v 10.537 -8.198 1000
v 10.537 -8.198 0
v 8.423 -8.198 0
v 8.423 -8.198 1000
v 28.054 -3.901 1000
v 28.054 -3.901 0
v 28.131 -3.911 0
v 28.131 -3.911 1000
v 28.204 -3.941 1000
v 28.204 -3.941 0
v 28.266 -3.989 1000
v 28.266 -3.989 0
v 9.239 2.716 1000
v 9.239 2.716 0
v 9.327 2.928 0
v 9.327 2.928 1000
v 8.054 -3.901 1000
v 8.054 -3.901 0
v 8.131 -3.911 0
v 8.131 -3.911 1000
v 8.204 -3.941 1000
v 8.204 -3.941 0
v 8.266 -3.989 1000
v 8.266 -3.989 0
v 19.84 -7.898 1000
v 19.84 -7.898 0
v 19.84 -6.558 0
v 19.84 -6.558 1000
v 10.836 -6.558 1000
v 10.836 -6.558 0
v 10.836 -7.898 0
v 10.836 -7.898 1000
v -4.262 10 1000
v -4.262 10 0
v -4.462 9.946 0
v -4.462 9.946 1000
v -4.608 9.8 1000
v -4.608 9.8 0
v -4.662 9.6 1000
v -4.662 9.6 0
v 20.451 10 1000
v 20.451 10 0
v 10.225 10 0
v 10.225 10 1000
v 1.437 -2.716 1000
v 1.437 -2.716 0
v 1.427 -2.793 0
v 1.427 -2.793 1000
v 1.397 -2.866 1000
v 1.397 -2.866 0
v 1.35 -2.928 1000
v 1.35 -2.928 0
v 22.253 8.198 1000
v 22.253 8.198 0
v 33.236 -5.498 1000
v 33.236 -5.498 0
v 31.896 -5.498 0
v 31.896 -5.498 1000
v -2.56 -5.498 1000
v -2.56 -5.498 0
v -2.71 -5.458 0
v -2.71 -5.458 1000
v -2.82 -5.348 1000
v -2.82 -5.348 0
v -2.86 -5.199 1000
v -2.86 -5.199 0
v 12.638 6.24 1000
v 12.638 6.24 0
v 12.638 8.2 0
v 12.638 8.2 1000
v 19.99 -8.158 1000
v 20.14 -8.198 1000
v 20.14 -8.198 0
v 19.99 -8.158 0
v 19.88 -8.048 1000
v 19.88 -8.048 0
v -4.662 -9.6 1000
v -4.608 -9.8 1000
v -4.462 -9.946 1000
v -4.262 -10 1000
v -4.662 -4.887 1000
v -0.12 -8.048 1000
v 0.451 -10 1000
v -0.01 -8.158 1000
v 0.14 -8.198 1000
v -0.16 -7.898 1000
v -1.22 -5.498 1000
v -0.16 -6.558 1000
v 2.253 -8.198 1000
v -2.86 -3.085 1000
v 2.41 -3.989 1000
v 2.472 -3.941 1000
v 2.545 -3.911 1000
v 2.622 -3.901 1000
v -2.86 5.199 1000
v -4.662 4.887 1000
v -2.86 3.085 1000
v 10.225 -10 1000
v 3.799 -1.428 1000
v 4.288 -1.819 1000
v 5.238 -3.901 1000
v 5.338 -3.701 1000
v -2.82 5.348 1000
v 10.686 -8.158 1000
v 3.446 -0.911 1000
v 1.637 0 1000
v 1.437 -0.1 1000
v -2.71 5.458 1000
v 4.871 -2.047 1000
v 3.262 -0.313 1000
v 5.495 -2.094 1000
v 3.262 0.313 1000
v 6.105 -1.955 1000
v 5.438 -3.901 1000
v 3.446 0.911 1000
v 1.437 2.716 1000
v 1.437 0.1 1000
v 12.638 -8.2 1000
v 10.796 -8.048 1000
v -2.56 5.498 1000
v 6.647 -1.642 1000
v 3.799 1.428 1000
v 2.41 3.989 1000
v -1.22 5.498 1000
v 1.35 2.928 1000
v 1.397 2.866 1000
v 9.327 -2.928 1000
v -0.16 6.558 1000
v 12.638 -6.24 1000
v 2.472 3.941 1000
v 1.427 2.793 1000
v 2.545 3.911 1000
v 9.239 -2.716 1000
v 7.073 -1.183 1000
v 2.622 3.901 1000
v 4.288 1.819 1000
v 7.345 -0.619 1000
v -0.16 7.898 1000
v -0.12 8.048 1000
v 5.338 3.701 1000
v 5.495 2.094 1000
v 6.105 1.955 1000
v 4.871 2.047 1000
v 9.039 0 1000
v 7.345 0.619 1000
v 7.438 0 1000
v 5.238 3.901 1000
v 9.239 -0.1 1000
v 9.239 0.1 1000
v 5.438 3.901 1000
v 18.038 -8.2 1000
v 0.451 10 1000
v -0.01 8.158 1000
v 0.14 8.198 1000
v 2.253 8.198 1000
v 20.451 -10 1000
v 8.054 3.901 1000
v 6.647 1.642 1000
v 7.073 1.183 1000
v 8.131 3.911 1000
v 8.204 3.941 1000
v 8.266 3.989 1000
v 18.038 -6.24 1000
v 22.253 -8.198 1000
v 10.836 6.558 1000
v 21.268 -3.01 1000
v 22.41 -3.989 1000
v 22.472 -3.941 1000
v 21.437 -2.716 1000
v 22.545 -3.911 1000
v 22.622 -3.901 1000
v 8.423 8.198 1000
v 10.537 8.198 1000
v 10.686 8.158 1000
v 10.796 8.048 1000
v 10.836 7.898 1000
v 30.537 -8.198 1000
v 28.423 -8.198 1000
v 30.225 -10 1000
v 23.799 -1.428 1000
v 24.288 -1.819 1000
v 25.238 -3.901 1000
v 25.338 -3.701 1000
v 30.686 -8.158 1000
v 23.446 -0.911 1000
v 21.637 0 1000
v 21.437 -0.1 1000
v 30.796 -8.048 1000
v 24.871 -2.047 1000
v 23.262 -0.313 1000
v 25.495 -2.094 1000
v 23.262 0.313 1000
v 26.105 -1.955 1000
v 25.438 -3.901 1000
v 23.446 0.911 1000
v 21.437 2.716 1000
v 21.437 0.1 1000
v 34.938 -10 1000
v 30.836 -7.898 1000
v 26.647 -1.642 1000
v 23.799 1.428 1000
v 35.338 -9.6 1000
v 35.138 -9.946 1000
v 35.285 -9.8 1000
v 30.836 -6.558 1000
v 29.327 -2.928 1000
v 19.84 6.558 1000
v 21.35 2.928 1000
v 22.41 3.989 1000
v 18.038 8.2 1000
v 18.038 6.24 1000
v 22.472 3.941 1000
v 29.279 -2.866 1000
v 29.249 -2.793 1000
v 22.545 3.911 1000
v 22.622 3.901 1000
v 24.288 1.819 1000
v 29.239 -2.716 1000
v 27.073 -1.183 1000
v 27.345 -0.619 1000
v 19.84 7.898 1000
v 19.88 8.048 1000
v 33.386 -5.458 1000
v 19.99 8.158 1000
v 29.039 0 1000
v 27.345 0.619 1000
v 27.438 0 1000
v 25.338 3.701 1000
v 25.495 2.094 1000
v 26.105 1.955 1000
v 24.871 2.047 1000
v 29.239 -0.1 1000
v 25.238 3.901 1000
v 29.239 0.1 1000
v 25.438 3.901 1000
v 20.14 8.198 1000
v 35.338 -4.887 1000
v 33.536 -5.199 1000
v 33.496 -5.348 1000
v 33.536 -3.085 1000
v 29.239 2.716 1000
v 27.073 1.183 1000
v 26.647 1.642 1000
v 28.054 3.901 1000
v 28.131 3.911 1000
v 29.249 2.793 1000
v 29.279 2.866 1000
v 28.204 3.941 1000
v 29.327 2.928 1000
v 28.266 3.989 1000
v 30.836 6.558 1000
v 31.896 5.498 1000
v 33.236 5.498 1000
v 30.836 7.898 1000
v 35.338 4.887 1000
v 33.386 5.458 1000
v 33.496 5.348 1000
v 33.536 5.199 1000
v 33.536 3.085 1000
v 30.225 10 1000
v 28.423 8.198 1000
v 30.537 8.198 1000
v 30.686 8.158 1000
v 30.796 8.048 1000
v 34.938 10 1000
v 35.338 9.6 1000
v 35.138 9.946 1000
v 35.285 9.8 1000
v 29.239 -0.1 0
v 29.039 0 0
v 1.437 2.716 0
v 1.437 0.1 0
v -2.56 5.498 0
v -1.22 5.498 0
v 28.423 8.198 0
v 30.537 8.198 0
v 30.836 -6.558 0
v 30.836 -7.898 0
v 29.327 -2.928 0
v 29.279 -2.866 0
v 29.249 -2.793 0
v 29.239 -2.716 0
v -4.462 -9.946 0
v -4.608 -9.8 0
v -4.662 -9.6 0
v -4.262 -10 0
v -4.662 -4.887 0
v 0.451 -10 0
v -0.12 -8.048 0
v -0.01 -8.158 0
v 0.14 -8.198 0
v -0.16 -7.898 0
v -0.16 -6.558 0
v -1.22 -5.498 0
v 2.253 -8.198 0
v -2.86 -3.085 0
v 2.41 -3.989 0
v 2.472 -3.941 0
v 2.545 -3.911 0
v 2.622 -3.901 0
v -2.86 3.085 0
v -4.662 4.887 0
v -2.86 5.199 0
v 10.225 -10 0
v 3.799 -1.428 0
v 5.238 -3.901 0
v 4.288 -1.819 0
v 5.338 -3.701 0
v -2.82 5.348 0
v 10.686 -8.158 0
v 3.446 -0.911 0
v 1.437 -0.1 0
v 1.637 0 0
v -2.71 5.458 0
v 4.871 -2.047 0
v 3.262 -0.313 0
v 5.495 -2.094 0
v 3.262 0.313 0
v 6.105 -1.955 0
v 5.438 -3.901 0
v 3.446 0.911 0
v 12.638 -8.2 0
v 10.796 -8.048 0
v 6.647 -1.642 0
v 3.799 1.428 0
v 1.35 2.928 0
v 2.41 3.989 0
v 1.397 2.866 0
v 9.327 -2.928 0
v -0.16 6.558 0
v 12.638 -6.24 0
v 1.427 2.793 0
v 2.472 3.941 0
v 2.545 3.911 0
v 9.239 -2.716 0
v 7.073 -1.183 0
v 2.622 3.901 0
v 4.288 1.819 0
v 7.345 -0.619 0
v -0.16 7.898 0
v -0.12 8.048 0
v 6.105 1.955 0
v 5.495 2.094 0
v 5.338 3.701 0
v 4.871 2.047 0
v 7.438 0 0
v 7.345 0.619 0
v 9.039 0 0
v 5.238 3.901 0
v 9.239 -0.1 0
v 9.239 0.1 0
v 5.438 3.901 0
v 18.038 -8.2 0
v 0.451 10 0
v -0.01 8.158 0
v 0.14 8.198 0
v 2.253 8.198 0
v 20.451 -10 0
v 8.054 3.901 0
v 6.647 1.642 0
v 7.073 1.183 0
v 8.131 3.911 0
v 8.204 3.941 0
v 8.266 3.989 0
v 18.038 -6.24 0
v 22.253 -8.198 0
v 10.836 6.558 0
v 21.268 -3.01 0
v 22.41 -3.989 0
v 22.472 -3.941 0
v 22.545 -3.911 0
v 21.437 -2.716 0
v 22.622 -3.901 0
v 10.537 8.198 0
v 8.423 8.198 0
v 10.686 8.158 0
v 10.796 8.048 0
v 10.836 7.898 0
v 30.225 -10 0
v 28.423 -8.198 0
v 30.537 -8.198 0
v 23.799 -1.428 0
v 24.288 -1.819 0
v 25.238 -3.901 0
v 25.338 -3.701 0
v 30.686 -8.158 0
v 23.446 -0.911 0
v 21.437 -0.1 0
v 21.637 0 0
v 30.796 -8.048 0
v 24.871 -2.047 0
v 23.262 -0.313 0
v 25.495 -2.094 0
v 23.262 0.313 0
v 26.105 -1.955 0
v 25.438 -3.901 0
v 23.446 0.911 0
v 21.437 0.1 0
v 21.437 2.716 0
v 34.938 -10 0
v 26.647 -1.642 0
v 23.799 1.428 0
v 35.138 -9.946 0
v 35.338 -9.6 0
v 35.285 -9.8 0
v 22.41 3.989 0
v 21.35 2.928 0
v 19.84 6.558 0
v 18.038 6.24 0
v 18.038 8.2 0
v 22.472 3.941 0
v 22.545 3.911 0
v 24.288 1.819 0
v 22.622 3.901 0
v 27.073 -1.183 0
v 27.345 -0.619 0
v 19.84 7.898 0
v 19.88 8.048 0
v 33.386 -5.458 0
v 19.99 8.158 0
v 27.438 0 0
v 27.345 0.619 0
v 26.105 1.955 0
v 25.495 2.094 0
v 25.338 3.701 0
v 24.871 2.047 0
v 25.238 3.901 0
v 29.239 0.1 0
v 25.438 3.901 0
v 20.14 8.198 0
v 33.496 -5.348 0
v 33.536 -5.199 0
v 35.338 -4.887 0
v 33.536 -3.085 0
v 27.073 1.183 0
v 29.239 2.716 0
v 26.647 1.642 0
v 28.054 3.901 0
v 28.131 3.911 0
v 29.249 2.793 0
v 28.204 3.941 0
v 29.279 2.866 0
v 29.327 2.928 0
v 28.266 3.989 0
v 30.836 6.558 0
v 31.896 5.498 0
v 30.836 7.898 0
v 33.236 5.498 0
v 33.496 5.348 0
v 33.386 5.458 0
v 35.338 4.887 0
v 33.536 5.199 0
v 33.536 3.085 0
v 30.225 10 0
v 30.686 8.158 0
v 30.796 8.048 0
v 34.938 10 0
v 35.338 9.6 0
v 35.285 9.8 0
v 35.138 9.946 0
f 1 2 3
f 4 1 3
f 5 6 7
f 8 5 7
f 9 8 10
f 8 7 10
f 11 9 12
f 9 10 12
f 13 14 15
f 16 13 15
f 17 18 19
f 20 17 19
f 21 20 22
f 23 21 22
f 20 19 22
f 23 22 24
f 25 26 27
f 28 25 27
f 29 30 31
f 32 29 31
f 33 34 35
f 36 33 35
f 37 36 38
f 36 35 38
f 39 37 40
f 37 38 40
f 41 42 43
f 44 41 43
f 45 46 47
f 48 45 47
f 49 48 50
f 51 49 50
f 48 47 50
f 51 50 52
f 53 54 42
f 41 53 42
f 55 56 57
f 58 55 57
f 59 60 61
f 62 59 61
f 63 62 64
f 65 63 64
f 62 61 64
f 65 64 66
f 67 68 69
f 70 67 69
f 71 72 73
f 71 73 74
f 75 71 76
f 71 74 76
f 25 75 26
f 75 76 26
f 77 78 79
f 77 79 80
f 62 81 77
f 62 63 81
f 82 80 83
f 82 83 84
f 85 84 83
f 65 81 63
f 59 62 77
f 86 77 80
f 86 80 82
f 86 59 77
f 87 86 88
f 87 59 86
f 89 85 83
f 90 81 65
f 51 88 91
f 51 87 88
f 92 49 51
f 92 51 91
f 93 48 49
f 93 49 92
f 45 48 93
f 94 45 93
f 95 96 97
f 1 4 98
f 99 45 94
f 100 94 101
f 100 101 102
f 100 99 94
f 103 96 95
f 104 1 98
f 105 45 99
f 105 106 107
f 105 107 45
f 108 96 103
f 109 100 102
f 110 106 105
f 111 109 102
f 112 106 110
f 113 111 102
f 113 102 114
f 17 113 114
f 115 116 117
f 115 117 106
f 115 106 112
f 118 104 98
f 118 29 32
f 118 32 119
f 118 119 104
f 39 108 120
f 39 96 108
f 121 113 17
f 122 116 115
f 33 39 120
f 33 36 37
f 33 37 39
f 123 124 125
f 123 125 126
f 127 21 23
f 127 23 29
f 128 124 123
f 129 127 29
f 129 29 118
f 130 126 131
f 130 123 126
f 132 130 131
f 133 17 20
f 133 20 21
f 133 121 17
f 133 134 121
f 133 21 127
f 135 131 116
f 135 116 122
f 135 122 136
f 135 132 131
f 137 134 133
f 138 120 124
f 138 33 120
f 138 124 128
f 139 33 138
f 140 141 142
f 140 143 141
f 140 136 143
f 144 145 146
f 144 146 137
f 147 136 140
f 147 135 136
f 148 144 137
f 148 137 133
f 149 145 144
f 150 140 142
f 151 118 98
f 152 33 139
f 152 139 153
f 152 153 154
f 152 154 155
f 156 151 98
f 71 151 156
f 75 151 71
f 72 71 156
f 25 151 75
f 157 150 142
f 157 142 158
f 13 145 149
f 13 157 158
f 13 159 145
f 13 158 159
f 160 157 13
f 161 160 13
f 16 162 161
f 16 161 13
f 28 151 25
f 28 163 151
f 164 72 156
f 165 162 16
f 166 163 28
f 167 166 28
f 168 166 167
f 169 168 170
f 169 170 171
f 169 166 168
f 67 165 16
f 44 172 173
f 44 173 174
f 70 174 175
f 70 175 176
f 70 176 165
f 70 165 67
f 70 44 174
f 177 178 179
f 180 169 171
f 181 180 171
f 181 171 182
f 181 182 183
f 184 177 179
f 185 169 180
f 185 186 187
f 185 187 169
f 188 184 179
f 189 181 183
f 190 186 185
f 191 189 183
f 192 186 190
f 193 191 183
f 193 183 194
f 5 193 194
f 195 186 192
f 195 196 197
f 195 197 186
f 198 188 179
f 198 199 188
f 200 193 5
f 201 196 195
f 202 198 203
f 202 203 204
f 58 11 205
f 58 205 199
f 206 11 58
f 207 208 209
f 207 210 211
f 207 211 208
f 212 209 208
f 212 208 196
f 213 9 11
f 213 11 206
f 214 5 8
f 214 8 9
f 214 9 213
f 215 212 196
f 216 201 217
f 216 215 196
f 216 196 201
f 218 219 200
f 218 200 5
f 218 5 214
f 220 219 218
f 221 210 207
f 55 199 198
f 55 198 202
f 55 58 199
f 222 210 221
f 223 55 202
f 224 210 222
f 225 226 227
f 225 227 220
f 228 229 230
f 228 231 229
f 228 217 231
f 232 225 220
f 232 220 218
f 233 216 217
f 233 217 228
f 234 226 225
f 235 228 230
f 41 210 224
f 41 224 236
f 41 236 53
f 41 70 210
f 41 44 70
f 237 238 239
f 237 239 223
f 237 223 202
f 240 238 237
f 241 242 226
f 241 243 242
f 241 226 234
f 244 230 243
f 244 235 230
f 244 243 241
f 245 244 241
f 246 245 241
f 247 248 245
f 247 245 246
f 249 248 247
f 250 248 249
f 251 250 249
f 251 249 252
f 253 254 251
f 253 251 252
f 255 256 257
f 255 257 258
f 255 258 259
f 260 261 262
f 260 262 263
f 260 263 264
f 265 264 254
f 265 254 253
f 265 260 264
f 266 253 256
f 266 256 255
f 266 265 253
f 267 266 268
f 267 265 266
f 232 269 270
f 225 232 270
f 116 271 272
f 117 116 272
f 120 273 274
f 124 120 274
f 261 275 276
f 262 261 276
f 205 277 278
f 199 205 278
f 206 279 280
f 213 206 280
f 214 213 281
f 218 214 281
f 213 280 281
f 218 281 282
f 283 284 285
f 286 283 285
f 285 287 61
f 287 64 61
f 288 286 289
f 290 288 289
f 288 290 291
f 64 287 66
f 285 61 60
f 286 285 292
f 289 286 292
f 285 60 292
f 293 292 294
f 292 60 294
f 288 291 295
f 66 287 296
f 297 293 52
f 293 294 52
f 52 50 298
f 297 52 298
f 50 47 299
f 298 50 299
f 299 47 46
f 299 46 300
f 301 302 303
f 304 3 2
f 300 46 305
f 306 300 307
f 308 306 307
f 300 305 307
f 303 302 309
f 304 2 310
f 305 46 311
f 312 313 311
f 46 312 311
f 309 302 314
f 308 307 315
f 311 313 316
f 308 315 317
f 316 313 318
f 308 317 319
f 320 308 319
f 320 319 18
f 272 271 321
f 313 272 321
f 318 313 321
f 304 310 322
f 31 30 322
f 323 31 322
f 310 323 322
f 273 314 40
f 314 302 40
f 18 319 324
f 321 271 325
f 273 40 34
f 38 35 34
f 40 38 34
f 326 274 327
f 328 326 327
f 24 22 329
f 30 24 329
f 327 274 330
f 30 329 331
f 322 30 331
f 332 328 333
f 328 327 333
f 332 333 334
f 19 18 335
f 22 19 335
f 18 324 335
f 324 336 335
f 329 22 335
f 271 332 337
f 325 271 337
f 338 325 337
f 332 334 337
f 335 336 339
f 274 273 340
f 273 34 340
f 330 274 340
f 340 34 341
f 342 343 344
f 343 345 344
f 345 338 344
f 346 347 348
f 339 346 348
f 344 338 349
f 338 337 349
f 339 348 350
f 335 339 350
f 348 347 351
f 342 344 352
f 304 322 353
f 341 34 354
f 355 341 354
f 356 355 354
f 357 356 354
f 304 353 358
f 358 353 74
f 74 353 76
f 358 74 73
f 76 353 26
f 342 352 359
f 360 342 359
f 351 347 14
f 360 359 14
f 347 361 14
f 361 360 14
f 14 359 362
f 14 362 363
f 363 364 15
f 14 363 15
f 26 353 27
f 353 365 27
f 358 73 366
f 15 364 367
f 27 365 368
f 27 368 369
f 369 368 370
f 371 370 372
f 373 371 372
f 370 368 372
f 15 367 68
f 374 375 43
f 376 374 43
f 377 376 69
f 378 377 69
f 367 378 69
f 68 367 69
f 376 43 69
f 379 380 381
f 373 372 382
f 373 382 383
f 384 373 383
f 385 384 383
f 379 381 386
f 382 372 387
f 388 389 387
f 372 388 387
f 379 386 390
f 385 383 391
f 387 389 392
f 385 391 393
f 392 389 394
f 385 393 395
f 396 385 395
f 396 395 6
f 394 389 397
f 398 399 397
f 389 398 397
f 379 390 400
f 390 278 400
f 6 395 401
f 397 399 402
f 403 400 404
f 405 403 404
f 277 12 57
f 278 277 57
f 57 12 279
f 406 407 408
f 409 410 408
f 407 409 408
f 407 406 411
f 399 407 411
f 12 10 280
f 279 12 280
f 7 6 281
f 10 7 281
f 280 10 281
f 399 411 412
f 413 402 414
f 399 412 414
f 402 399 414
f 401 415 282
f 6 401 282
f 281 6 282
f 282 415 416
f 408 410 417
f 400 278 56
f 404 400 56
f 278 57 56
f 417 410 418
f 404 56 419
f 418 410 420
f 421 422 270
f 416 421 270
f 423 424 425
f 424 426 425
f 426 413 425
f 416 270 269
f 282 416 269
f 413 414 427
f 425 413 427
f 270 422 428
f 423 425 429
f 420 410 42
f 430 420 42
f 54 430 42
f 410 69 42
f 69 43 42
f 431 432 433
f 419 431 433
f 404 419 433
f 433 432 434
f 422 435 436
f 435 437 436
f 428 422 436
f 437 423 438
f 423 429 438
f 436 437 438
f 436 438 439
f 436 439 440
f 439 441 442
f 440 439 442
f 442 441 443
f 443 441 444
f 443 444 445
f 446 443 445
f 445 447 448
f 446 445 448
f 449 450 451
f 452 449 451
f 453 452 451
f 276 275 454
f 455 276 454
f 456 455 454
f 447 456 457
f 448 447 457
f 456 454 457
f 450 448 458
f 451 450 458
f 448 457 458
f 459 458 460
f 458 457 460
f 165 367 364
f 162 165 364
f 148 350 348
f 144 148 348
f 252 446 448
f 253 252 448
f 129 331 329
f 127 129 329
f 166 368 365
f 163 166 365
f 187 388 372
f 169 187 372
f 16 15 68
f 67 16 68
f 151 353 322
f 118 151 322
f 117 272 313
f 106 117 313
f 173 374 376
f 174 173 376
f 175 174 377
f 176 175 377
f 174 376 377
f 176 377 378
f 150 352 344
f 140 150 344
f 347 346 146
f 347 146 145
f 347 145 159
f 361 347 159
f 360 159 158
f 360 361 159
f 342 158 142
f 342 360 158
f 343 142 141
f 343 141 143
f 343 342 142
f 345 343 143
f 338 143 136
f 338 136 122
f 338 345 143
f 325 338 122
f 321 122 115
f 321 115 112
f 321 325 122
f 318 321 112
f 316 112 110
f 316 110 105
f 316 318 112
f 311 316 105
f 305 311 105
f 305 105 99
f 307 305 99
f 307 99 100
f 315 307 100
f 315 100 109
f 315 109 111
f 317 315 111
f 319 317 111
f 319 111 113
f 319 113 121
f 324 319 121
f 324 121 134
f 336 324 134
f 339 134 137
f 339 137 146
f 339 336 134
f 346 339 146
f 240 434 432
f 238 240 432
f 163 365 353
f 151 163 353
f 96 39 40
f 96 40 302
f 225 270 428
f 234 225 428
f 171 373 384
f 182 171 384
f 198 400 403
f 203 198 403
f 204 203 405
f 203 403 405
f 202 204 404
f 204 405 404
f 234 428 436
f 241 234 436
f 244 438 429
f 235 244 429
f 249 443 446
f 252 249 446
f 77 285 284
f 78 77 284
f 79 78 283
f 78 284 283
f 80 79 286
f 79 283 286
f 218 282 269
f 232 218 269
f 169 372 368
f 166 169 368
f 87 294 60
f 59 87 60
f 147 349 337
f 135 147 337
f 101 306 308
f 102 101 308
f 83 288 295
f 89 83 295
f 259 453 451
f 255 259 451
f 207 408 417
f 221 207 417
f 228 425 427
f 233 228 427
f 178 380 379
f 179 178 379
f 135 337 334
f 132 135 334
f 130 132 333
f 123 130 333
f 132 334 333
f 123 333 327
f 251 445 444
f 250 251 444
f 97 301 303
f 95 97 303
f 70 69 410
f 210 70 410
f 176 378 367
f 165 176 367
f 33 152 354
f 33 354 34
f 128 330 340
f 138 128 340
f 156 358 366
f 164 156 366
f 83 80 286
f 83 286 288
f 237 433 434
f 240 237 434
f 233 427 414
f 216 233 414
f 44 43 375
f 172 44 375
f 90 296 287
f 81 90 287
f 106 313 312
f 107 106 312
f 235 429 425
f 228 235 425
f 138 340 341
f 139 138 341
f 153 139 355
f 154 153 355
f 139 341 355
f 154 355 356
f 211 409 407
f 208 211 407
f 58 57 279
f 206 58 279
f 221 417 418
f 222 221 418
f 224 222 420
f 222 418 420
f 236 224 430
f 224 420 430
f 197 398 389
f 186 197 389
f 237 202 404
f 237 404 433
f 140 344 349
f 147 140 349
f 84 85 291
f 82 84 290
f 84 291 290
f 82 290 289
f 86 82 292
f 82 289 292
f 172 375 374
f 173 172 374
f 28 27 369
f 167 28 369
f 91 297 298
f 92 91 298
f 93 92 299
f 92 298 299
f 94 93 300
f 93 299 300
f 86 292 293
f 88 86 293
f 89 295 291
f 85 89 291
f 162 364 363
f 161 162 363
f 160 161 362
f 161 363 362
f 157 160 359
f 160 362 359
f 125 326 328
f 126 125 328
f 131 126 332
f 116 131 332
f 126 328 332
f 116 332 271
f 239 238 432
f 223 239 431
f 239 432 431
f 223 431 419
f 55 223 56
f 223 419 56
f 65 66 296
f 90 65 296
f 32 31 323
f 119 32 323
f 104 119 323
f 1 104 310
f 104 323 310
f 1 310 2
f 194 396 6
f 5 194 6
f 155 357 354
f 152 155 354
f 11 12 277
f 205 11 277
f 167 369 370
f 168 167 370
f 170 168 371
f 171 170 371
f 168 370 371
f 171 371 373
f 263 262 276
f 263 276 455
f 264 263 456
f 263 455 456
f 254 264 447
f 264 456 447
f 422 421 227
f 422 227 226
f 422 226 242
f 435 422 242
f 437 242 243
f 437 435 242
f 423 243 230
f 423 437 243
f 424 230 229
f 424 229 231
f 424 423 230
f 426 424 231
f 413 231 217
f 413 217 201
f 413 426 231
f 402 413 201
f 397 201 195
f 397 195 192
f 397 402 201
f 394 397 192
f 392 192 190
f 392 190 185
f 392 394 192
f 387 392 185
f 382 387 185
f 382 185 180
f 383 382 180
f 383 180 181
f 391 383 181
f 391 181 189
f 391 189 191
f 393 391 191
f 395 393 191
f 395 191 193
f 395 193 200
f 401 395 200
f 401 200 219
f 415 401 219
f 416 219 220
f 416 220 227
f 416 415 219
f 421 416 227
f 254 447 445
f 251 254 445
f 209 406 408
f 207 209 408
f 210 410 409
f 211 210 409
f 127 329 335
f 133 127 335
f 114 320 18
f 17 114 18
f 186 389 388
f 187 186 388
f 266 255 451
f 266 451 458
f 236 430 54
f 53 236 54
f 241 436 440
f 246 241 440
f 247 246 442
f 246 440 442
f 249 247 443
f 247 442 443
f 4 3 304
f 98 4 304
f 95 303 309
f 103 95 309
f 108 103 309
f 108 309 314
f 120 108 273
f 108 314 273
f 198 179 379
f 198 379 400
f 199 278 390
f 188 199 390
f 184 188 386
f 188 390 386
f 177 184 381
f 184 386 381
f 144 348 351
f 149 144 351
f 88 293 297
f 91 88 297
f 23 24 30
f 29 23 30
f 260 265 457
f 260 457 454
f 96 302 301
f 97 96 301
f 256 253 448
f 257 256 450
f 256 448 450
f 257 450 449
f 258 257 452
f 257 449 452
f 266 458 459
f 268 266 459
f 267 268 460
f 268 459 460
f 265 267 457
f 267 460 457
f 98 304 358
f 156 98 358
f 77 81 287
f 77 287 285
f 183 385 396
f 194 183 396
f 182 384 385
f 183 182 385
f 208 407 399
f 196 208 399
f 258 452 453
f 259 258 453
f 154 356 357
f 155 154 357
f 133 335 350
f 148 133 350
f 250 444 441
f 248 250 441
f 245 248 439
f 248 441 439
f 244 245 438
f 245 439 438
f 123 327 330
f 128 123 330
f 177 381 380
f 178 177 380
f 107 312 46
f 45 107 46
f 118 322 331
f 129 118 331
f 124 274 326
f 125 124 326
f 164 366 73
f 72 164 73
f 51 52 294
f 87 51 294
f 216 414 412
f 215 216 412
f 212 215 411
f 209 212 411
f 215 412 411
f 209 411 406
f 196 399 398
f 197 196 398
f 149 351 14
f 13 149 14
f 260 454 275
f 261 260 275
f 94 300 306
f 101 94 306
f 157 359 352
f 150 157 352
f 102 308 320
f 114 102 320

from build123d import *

# Parameters (mm, degrees)
F0_R     = 2.1
F1_DEPTH = 1000


# Not quite as in the source:
# - ends of sketch curves that miss each other by under 0.0002 mm in the source are joined


with BuildPart() as f1:
    # F0 (on Top) → F1 (new body)
    with BuildSketch(Plane.XY):
        with BuildLine():
            Line((-2.860219, 3.085333), (-2.860219, 5.198566))
            ThreePointArc((-2.860219, 5.198566), (-2.7720364303, 5.4101211696), (-2.56022, 5.497674))
            Line((-2.56022, 5.497674), (-1.22022, 5.497674))
            Line((-1.22022, 5.497674), (1.349586, 2.927868))
            ThreePointArc((1.349586, 2.927868), (1.4146178598, 2.8305410297), (1.437454, 2.715736))
            Line((1.437454, 2.715736), (1.437454, 0.1))
            Line((1.437454, 0.1), (1.637454, 0))
            Line((1.637454, 0), (1.437454, -0.1))
            Line((1.437454, -0.1), (1.437454, -2.715736))
            ThreePointArc((1.437454, -2.715736), (1.4146178598, -2.8305410297), (1.3495860344, -2.9278680344))
            Line((1.3495860344, -2.9278680344), (-1.22022, -5.497674))
            Line((-1.22022, -5.497674), (-2.56022, -5.497674))
            ThreePointArc((-2.56022, -5.497674), (-2.7720364303, -5.4101211696), (-2.8602186739, -5.198565999))
            Line((-2.8602186739, -5.198565999), (-2.860219, -3.085333))
            Line((-2.860219, -3.085333), (-4.661886, -4.887))
            Line((-4.661886, -4.887), (-4.661886, -9.6))
            ThreePointArc((-4.661886, -9.6), (-4.5447287125, -9.8828427125), (-4.261886, -10))
            Line((-4.261886, -10), (0.451114, -10))
            Line((0.451114, -10), (2.252781, -8.198333))
            Line((2.252781, -8.198333), (0.139548, -8.198333))
            ThreePointArc((0.139548, -8.198333), (-0.0720071696, -8.1101504303), (-0.15956, -7.898334))
            Line((-0.15956, -7.898334), (-0.15956, -6.558334))
            Line((-0.15956, -6.558334), (2.410246, -3.988528))
            ThreePointArc((2.410246, -3.988528), (2.5075729703, -3.9234961402), (2.622378, -3.90066))
            Line((2.622378, -3.90066), (5.238114, -3.90066))
            Line((5.238114, -3.90066), (5.338114, -3.70066))
            Line((5.338114, -3.70066), (5.438114, -3.90066))
            Line((5.438114, -3.90066), (8.05385, -3.90066))
            ThreePointArc((8.05385, -3.90066), (8.1686550297, -3.9234961402), (8.2659820344, -3.9885279656))
            Line((8.2659820344, -3.9885279656), (10.835788, -6.558334))
            Line((10.835788, -6.558334), (10.835788, -7.898334))
            ThreePointArc((10.835788, -7.898334), (10.7482351696, -8.1101504303), (10.536679999, -8.1983326739))
            Line((10.536679999, -8.1983326739), (8.423447, -8.198333))
            Line((8.423447, -8.198333), (10.225114, -10))
            Line((10.225114, -10), (20.451114, -10))
            Line((20.451114, -10), (22.252781, -8.198333))
            Line((22.252781, -8.198333), (20.139548, -8.198333))
            ThreePointArc((20.139548, -8.198333), (19.9279928304, -8.1101504303), (19.84044, -7.898334))
            Line((19.84044, -7.898334), (19.84044, -6.558334))
            Line((19.84044, -6.558334), (22.410246, -3.988528))
            ThreePointArc((22.410246, -3.988528), (22.5075729703, -3.9234961402), (22.622378, -3.90066))
            Line((22.622378, -3.90066), (25.238114, -3.90066))
            Line((25.238114, -3.90066), (25.338114, -3.70066))
            Line((25.338114, -3.70066), (25.438114, -3.90066))
            Line((25.438114, -3.90066), (28.05385, -3.90066))
            ThreePointArc((28.05385, -3.90066), (28.1686550297, -3.9234961402), (28.2659820344, -3.9885279656))
            Line((28.2659820344, -3.9885279656), (30.835788, -6.558334))
            Line((30.835788, -6.558334), (30.835788, -7.898334))
            ThreePointArc((30.835788, -7.898334), (30.7482351696, -8.1101504303), (30.536679999, -8.1983326739))
            Line((30.536679999, -8.1983326739), (28.423447, -8.198333))
            Line((28.423447, -8.198333), (30.225114, -10))
            Line((30.225114, -10), (34.938114, -10))
            ThreePointArc((34.938114, -10), (35.2209567125, -9.8828427125), (35.338114, -9.6))
            Line((35.338114, -9.6), (35.338114, -4.887))
            Line((35.338114, -4.887), (33.536447, -3.085333))
            Line((33.536447, -3.085333), (33.536447, -5.198566))
            ThreePointArc((33.536447, -5.198566), (33.4482644303, -5.4101211696), (33.236448, -5.497674))
            Line((33.236448, -5.497674), (31.896448, -5.497674))
            Line((31.896448, -5.497674), (29.326642, -2.927868))
            ThreePointArc((29.326642, -2.927868), (29.2616101402, -2.8305410297), (29.238774, -2.715736))
            Line((29.238774, -2.715736), (29.238774, -0.1))
            Line((29.238774, -0.1), (29.038774, 0))
            Line((29.038774, 0), (29.238774, 0.1))
            Line((29.238774, 0.1), (29.238774, 2.715736))
            ThreePointArc((29.238774, 2.715736), (29.2616101402, 2.8305410297), (29.3266419656, 2.9278680344))
            Line((29.3266419656, 2.9278680344), (31.896448, 5.497674))
            Line((31.896448, 5.497674), (33.236448, 5.497674))
            ThreePointArc((33.236448, 5.497674), (33.4482644303, 5.4101211696), (33.5364466739, 5.198565999))
            Line((33.5364466739, 5.198565999), (33.536447, 3.085333))
            Line((33.536447, 3.085333), (35.338114, 4.887))
            Line((35.338114, 4.887), (35.338114, 9.6))
            ThreePointArc((35.338114, 9.6), (35.2209567125, 9.8828427125), (34.938114, 10))
            Line((34.938114, 10), (30.225114, 10))
            Line((30.225114, 10), (28.423447, 8.198333))
            Line((28.423447, 8.198333), (30.53668, 8.198333))
            ThreePointArc((30.53668, 8.198333), (30.7482351696, 8.1101504303), (30.835788, 7.898334))
            Line((30.835788, 7.898334), (30.835788, 6.558334))
            Line((30.835788, 6.558334), (28.265982, 3.988528))
            ThreePointArc((28.265982, 3.988528), (28.1686550297, 3.9234961402), (28.05385, 3.90066))
            Line((28.05385, 3.90066), (25.438114, 3.90066))
            Line((25.438114, 3.90066), (25.338114, 3.70066))
            Line((25.338114, 3.70066), (25.238114, 3.90066))
            Line((25.238114, 3.90066), (22.622378, 3.90066))
            ThreePointArc((22.622378, 3.90066), (22.5075729703, 3.9234961402), (22.4102459656, 3.9885279656))
            Line((22.4102459656, 3.9885279656), (19.84044, 6.558334))
            Line((19.84044, 6.558334), (19.84044, 7.898334))
            ThreePointArc((19.84044, 7.898334), (19.9279928304, 8.1101504303), (20.139548001, 8.1983326739))
            Line((20.139548001, 8.1983326739), (22.252781, 8.198333))
            Line((22.252781, 8.198333), (20.451114, 10))
            Line((20.451114, 10), (10.225114, 10))
            Line((10.225114, 10), (8.423447, 8.198333))
            Line((8.423447, 8.198333), (10.53668, 8.198333))
            ThreePointArc((10.53668, 8.198333), (10.7482351696, 8.1101504303), (10.835788, 7.898334))
            Line((10.835788, 7.898334), (10.835788, 6.558334))
            Line((10.835788, 6.558334), (8.265982, 3.988528))
            ThreePointArc((8.265982, 3.988528), (8.1686550297, 3.9234961402), (8.05385, 3.90066))
            Line((8.05385, 3.90066), (5.438114, 3.90066))
            Line((5.438114, 3.90066), (5.338114, 3.70066))
            Line((5.338114, 3.70066), (5.238114, 3.90066))
            Line((5.238114, 3.90066), (2.622378, 3.90066))
            ThreePointArc((2.622378, 3.90066), (2.5075729703, 3.9234961402), (2.4102459656, 3.9885279656))
            Line((2.4102459656, 3.9885279656), (-0.15956, 6.558334))
            Line((-0.15956, 6.558334), (-0.15956, 7.898334))
            ThreePointArc((-0.15956, 7.898334), (-0.0720071696, 8.1101504303), (0.139548001, 8.1983326739))
            Line((0.139548001, 8.1983326739), (2.252781, 8.198333))
            Line((2.252781, 8.198333), (0.451114, 10))
            Line((0.451114, 10), (-4.261886, 10))
            ThreePointArc((-4.261886, 10), (-4.5447287125, 9.8828427125), (-4.661886, 9.6))
            Line((-4.661886, 9.6), (-4.661886, 4.887))
            Line((-4.661886, 4.887), (-2.860219, 3.085333))
        make_face()
        with Locations((5.338114, 0)):
            Circle(F0_R, mode=Mode.SUBTRACT)
        Polygon((12.638114, 6.24), (12.638114, 8.2), (18.038114, 8.2), (18.038114, 6.24), (21.349586, 2.927868), (21.437454, 2.715736), (21.437454, 0.1), (21.637454, 0), (21.437454, -0.1), (21.437454, -2.715736), (21.267706, -3.009748), (18.038114, -6.24), (18.037784, -8.2), (12.638114, -8.2), (12.638444, -6.23967), (9.326642, -2.927868), (9.238774, -2.715736), (9.238774, -0.1), (9.038774, 0), (9.238774, 0.1), (9.238774, 2.715736), (9.326642, 2.927868), align=None, mode=Mode.SUBTRACT)
        with Locations((25.338114, 0)):
            Circle(F0_R, mode=Mode.SUBTRACT)
    extrude(amount=F1_DEPTH)


solid = f1.part
